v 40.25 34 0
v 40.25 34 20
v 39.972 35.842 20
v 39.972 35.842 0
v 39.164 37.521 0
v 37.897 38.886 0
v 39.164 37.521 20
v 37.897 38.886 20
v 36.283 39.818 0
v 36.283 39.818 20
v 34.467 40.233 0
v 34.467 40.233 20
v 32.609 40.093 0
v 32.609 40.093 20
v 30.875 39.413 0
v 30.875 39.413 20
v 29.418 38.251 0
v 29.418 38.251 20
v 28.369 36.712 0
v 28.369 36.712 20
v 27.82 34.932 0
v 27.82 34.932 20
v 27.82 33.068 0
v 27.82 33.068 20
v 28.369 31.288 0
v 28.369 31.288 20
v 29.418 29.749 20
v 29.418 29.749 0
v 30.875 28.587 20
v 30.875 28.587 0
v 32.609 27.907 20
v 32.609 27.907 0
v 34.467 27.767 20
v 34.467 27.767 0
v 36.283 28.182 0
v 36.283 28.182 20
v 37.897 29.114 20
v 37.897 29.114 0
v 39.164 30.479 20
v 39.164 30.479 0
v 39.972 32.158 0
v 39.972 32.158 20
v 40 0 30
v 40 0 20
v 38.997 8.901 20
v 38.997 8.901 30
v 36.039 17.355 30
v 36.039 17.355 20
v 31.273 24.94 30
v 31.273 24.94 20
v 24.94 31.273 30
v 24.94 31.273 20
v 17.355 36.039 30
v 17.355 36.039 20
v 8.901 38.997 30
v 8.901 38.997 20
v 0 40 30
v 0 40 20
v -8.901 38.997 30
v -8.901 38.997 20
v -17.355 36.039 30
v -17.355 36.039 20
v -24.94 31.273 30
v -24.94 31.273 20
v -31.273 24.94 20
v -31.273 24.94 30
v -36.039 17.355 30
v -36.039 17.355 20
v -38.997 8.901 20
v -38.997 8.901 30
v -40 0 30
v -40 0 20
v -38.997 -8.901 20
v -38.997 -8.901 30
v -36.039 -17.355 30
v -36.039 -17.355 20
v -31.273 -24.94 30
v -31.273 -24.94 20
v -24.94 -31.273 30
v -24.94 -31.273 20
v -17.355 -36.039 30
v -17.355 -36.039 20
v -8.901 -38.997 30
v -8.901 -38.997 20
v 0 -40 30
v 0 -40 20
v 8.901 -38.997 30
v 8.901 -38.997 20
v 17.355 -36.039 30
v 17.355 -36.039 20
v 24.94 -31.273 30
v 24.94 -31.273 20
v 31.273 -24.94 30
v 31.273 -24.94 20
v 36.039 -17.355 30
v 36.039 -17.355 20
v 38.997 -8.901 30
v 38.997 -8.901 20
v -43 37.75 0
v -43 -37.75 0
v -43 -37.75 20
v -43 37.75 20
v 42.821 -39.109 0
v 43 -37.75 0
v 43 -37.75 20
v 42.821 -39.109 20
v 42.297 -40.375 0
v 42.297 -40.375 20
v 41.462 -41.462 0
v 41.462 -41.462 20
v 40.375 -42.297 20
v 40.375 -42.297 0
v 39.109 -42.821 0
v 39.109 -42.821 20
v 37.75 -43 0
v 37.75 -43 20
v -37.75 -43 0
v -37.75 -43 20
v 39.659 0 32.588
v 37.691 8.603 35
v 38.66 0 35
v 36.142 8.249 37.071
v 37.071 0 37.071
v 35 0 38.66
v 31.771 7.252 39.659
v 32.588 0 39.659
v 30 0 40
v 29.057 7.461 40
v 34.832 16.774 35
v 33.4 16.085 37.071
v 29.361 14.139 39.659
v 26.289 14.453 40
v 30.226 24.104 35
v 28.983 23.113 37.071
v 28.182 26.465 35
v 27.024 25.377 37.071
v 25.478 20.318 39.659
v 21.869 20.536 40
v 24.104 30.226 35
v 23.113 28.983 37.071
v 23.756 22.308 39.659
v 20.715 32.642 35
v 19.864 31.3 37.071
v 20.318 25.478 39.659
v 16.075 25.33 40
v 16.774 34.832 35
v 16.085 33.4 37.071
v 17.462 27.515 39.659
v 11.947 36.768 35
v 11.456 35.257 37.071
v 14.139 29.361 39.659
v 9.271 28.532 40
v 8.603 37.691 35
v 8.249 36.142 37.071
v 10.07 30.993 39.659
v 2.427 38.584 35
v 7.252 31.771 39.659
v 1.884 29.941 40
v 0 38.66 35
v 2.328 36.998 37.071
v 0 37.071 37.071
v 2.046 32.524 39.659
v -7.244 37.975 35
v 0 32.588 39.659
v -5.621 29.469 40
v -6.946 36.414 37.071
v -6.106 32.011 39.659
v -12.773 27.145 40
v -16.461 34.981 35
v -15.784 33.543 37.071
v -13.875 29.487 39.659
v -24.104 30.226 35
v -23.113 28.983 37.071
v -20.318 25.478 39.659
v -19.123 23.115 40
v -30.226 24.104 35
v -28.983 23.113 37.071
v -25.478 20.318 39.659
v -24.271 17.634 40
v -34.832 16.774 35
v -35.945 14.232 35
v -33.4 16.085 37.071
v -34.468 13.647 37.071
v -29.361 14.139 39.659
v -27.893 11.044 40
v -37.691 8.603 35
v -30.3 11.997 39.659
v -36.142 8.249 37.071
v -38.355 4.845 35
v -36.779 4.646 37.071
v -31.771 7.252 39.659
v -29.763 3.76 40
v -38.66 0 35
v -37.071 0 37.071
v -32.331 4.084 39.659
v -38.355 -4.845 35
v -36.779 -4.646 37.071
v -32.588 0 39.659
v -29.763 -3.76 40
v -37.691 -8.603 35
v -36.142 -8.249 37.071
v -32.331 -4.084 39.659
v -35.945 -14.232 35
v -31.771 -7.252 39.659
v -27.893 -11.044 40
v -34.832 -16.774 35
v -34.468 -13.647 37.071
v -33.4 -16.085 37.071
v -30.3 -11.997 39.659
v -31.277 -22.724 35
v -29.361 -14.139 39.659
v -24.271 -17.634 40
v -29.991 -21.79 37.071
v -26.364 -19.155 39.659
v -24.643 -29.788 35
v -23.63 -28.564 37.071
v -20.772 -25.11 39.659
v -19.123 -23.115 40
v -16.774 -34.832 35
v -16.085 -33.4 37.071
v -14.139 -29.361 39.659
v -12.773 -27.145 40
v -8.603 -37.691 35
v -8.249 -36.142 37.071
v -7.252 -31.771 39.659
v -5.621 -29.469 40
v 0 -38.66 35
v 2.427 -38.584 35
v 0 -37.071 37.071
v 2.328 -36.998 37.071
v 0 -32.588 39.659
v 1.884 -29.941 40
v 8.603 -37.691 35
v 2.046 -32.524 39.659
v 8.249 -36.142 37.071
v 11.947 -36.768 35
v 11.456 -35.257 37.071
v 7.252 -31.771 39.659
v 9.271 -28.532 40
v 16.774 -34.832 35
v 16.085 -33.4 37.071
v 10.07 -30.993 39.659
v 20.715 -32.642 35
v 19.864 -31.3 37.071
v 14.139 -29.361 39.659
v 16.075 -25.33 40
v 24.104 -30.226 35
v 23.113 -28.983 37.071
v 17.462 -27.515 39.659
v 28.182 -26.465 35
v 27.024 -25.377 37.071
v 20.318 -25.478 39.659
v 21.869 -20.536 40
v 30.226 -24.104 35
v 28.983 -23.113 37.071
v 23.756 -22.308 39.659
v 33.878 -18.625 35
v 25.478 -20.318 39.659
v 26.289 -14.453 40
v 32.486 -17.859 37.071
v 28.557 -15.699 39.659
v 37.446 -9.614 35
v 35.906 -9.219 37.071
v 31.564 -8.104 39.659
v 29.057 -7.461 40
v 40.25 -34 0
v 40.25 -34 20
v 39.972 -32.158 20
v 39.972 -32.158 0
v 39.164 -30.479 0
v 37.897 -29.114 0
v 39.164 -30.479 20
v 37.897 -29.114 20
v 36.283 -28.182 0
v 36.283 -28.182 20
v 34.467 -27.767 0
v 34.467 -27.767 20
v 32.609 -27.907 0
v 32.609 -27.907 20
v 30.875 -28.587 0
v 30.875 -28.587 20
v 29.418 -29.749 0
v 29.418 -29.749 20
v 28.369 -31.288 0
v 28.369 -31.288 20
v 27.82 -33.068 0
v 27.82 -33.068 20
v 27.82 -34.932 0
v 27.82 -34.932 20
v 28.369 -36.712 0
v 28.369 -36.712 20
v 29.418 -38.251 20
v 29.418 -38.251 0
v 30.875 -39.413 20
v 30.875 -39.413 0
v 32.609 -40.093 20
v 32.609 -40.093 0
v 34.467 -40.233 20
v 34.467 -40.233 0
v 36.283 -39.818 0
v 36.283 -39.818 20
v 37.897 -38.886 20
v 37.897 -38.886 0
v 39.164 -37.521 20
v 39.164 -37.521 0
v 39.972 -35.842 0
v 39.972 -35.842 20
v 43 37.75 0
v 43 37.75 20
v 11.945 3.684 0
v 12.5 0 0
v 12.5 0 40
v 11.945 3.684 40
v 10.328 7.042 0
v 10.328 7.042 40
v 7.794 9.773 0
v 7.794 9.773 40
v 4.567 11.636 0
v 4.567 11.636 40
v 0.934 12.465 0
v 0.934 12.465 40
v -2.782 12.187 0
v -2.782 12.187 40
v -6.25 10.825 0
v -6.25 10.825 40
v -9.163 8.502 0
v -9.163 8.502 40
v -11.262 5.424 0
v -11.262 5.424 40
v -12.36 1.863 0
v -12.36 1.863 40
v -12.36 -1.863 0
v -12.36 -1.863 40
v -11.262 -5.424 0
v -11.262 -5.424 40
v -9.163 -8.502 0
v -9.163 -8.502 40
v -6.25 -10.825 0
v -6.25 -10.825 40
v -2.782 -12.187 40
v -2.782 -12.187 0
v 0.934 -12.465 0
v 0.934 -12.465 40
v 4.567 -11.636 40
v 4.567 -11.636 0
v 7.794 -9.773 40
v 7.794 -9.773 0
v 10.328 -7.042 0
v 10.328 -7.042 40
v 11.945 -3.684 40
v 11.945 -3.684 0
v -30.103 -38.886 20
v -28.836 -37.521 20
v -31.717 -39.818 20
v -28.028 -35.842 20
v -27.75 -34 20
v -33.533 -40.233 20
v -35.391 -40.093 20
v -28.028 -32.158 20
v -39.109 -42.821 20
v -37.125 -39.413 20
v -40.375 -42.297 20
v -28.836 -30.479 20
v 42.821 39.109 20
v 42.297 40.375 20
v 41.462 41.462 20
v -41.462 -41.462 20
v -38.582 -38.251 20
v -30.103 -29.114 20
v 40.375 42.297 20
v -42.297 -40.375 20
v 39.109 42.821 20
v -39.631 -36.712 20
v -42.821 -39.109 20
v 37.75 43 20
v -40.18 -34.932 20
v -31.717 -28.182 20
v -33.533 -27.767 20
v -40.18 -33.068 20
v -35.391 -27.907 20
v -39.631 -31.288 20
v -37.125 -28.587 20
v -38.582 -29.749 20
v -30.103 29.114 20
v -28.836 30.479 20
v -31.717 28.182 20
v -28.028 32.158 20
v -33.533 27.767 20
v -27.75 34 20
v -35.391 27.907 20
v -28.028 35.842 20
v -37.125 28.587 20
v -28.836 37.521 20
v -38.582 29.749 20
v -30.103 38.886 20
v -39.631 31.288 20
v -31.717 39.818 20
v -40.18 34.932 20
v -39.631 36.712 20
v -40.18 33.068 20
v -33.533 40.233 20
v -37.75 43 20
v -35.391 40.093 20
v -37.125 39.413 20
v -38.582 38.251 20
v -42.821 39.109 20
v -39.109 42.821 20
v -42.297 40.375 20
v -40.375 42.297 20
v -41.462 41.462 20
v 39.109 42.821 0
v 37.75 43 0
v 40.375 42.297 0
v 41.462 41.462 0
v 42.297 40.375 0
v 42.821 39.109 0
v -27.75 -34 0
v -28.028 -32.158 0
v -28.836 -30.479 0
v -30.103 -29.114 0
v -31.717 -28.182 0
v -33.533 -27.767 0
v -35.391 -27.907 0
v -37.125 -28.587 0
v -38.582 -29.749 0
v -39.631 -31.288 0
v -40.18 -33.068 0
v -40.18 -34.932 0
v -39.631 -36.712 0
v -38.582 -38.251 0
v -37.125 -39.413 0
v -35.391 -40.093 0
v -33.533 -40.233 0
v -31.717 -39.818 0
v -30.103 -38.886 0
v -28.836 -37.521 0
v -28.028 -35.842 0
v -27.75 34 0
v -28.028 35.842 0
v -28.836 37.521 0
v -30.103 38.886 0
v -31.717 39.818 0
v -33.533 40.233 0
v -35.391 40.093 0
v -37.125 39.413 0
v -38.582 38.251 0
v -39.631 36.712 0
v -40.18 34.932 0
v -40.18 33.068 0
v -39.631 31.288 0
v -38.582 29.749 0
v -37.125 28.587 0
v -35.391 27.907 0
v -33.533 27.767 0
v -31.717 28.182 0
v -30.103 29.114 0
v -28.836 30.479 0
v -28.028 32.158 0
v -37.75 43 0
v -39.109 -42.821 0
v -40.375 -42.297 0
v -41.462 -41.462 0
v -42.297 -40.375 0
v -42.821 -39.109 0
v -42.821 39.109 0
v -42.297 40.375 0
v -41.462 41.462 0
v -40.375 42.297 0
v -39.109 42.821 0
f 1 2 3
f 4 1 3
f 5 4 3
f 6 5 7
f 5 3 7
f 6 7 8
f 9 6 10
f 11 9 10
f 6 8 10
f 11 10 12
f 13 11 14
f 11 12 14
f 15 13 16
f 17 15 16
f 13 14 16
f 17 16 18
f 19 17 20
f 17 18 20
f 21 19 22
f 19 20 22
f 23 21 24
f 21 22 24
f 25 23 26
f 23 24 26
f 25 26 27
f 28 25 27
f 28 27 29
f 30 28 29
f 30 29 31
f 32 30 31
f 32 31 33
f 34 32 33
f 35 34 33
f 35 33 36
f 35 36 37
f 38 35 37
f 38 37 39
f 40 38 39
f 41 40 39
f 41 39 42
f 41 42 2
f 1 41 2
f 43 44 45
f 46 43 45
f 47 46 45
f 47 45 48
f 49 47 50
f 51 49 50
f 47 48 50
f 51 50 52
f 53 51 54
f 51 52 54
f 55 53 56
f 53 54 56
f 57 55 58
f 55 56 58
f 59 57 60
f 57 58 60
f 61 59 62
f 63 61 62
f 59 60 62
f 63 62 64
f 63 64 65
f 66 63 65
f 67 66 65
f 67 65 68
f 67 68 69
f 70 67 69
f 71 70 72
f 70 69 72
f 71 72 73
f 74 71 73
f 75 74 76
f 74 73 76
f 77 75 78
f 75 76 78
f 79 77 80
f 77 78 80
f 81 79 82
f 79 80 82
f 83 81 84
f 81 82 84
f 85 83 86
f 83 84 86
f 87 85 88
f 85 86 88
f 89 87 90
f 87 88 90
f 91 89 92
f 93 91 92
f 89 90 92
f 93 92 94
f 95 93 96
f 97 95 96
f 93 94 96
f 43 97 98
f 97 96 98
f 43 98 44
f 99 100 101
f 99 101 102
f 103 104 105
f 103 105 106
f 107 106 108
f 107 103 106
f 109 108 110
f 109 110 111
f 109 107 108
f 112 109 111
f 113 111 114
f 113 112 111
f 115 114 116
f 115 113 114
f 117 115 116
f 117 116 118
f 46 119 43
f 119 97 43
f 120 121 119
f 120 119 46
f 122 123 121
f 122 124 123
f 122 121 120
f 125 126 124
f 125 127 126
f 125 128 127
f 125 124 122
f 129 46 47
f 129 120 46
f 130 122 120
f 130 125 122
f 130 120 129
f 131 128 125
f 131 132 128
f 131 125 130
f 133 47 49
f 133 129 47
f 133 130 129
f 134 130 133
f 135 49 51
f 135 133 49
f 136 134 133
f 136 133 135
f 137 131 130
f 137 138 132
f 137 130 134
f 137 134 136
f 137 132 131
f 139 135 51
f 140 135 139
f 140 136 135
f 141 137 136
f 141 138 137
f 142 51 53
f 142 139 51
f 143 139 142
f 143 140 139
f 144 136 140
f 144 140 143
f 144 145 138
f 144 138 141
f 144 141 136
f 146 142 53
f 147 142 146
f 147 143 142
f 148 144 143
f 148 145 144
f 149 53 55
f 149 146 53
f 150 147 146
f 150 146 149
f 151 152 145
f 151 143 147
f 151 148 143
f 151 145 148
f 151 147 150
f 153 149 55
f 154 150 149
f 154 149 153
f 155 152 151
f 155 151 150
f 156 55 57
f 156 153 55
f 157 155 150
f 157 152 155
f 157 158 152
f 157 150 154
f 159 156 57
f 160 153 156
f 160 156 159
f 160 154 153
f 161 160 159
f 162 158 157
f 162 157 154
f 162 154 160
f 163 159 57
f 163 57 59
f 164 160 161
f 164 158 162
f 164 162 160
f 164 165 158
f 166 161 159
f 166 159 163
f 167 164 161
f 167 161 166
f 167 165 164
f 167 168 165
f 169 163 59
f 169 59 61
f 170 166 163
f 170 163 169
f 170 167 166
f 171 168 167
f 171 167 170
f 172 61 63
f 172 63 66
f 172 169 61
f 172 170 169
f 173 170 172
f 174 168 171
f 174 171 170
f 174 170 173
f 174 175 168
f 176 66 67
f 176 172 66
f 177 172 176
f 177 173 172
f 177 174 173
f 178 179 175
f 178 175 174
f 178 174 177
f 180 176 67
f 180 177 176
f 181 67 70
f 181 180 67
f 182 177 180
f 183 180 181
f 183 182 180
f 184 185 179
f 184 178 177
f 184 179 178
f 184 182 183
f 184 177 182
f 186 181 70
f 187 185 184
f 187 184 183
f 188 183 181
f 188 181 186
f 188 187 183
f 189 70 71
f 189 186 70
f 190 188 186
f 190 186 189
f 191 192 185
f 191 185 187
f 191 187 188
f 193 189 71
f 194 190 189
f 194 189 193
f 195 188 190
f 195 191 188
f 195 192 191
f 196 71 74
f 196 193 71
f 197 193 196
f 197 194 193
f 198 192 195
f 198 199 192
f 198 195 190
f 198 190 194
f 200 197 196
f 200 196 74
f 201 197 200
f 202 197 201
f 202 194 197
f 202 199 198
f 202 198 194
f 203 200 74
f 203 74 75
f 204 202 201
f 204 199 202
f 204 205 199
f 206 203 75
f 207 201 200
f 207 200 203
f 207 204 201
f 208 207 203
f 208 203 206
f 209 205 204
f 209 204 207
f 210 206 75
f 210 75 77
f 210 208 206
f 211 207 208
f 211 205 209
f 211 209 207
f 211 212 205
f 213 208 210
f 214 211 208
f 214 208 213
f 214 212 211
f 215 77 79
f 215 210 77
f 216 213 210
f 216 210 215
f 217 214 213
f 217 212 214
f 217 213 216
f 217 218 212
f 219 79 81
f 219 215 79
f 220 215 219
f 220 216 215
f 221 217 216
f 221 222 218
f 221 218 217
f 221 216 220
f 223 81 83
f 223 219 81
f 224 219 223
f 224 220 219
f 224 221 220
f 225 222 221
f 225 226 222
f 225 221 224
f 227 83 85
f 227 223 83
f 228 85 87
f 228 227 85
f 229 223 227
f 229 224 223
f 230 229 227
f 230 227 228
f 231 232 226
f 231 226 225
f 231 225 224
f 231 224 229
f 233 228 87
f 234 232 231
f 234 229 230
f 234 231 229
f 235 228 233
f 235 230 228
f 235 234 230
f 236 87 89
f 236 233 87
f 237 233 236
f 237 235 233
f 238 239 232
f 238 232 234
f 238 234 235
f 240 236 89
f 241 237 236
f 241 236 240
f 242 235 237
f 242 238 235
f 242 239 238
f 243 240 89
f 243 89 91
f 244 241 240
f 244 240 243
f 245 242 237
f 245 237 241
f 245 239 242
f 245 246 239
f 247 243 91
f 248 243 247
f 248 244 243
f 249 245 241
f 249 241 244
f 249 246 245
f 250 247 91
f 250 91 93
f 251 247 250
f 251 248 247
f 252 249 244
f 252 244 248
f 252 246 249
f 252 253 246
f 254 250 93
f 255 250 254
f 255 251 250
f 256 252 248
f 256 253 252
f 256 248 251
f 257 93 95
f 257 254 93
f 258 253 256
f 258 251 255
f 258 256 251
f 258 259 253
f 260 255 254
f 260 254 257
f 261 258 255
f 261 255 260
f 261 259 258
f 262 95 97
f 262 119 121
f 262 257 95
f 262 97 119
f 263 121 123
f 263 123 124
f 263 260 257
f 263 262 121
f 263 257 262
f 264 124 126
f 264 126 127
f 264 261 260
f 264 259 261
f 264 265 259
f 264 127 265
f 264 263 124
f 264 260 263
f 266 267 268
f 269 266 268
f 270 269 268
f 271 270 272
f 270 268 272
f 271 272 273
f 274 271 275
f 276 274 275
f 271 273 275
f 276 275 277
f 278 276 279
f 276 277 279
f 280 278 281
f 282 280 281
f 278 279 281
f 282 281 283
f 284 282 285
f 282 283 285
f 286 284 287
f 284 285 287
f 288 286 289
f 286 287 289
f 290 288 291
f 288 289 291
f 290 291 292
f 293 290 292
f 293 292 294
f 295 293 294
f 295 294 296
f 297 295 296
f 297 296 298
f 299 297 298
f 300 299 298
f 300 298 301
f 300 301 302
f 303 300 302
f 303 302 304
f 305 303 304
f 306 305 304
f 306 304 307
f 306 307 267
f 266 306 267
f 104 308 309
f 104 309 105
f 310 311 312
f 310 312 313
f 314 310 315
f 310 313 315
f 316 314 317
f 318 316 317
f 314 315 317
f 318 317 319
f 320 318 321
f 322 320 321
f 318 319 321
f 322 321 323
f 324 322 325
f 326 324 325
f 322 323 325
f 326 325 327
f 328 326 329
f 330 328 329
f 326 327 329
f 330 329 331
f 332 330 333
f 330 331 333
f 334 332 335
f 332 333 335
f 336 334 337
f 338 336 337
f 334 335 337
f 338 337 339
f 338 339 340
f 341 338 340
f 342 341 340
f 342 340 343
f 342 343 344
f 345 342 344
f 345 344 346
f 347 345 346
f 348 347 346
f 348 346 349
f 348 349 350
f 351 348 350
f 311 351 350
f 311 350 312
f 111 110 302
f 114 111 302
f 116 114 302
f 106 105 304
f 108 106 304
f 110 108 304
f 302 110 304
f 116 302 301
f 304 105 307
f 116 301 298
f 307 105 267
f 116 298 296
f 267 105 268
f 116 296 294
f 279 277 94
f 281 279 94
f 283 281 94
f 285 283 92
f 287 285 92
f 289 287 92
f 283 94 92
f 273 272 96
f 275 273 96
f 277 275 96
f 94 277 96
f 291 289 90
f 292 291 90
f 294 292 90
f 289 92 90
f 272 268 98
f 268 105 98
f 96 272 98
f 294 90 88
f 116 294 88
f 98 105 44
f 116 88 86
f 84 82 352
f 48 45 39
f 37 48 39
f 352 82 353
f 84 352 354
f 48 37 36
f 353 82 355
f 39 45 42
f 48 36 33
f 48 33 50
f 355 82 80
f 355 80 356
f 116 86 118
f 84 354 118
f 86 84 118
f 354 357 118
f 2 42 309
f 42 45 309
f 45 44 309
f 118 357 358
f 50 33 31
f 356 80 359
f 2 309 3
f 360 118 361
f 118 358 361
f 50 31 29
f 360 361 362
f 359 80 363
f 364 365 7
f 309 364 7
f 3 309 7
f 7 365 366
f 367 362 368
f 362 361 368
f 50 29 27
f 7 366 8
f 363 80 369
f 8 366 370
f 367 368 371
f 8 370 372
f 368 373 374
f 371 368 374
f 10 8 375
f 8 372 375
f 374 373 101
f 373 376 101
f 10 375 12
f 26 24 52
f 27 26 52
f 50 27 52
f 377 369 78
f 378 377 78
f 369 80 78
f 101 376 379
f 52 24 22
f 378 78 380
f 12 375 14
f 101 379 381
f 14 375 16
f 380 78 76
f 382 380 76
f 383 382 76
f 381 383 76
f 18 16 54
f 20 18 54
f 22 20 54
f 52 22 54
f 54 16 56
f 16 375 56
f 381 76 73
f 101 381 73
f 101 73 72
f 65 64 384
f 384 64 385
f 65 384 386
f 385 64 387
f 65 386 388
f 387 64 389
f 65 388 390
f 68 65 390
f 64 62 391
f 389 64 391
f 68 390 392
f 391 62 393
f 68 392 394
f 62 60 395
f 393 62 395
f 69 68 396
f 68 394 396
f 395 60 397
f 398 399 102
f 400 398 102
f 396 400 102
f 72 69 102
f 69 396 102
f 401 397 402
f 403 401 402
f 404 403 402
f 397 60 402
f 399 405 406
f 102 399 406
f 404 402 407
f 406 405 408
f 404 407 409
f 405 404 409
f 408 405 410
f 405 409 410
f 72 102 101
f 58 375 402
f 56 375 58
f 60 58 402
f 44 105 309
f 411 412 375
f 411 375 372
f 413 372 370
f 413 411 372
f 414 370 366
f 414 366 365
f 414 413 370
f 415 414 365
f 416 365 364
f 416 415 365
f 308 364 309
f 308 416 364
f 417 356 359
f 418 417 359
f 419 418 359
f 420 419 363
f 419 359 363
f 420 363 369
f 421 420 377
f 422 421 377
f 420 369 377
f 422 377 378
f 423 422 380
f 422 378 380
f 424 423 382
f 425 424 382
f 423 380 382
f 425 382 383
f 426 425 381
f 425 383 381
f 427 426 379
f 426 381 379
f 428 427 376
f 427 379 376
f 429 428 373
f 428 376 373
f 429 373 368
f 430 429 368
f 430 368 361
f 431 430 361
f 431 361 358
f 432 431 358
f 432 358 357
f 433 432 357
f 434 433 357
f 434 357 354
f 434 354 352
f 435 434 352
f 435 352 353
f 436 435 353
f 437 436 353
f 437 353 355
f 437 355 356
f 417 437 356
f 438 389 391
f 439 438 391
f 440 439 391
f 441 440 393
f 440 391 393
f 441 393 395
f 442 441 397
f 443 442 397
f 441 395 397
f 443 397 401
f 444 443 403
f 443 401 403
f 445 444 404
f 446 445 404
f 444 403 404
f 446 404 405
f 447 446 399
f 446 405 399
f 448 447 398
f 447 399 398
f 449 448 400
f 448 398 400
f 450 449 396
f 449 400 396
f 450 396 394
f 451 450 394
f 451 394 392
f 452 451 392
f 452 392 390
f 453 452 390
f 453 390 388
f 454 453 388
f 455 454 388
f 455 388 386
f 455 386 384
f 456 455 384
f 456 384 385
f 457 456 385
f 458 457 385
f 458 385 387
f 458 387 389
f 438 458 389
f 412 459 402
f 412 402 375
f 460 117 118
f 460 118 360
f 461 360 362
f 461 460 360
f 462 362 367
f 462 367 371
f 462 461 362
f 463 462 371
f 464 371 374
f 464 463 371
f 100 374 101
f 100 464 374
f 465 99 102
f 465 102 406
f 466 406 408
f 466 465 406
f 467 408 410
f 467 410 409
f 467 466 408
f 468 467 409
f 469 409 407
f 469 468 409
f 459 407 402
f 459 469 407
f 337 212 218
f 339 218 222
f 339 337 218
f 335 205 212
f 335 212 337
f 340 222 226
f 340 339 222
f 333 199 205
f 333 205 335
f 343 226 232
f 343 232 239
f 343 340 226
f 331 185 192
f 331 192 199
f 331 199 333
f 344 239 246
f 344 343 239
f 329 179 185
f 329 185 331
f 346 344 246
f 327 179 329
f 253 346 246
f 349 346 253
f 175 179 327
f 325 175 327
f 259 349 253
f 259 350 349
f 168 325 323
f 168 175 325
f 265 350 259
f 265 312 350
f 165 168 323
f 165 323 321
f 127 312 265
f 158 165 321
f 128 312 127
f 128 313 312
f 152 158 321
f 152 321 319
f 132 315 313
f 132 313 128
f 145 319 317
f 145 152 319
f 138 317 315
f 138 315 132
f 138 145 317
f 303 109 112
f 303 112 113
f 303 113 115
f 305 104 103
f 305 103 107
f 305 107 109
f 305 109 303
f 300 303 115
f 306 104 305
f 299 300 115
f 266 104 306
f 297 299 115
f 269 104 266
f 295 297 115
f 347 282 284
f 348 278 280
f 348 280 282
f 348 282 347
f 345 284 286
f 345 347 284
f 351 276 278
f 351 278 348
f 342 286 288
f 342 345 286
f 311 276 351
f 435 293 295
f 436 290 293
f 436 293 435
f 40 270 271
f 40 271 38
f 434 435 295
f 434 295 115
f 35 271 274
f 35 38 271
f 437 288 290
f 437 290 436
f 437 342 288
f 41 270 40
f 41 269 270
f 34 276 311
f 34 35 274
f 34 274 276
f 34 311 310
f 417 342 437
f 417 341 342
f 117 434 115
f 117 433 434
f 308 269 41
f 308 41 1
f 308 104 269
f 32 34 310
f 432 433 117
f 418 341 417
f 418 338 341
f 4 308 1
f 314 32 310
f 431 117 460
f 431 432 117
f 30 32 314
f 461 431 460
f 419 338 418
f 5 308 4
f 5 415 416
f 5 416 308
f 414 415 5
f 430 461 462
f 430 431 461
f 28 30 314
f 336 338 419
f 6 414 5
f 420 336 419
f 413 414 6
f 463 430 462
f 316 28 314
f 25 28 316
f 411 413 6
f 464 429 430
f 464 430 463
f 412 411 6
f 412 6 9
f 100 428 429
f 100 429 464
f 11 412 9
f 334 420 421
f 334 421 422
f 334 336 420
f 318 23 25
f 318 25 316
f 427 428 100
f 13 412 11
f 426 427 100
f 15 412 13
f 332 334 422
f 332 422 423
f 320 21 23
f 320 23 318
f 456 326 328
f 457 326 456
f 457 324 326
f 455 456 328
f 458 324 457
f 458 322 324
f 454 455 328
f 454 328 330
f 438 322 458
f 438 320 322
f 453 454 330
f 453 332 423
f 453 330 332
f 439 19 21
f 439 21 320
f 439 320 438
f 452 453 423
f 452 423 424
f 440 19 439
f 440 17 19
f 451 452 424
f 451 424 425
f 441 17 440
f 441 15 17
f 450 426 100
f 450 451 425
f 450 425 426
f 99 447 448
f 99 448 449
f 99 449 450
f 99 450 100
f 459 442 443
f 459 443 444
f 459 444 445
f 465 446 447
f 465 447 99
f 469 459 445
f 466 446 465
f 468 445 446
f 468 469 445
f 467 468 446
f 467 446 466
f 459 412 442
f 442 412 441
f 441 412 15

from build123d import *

# Parameters (mm, degrees)
BOSS_EXTRUDE1_DEPTH = 20
SKETCH2_R           = 40
BOSS_EXTRUDE2_DEPTH = 20
SKETCH3_R           = 12.5
SKETCH3_R_2         = 6.25
CUT_EXTRUDE1_DEPTH  = 41
FILLET1_R           = 10


with BuildPart() as part:
    # Sketch1 → Boss-Extrude1 (new body)
    with BuildSketch(Plane.XY):
        with BuildLine():
            Line((37.75, -43), (-37.75, -43))
            ThreePointArc((-37.75, -43), (-41.462310601, -41.462310601), (-43, -37.75))
            Line((-43, -37.75), (-43, 37.75))
            ThreePointArc((-43, 37.75), (-41.462310601, 41.462310601), (-37.75, 43))
            Line((-37.75, 43), (37.75, 43))
            ThreePointArc((37.75, 43), (41.462310601, 41.462310601), (43, 37.75))
            Line((43, 37.75), (43, -37.75))
            ThreePointArc((43, -37.75), (41.462310601, -41.462310601), (37.75, -43))
        make_face()
    extrude(amount=BOSS_EXTRUDE1_DEPTH)

    # Sketch2 → Boss-Extrude2 (add)
    with BuildSketch(Plane.XY.offset(20)):
        Circle(SKETCH2_R)
    extrude(amount=BOSS_EXTRUDE2_DEPTH)

    # Sketch3 → Cut-Extrude1 (cut, through all)
    with BuildSketch(Plane.XY.offset(40)):
        Circle(SKETCH3_R)
        with Locations((-34, 34)):
            Circle(SKETCH3_R_2)
        with Locations((34, 34)):
            Circle(SKETCH3_R_2)
        with Locations((34, -34)):
            Circle(SKETCH3_R_2)
        with Locations((-34, -34)):
            Circle(SKETCH3_R_2)
    extrude(amount=-CUT_EXTRUDE1_DEPTH, mode=Mode.SUBTRACT)

    # Fillet1
    fillet1_edges = [part.edges().sort_by_distance(p)[0] for p in [
        (-40, 0, 40),
    ]]
    fillet(fillet1_edges, radius=FILLET1_R)


solid = part.part
